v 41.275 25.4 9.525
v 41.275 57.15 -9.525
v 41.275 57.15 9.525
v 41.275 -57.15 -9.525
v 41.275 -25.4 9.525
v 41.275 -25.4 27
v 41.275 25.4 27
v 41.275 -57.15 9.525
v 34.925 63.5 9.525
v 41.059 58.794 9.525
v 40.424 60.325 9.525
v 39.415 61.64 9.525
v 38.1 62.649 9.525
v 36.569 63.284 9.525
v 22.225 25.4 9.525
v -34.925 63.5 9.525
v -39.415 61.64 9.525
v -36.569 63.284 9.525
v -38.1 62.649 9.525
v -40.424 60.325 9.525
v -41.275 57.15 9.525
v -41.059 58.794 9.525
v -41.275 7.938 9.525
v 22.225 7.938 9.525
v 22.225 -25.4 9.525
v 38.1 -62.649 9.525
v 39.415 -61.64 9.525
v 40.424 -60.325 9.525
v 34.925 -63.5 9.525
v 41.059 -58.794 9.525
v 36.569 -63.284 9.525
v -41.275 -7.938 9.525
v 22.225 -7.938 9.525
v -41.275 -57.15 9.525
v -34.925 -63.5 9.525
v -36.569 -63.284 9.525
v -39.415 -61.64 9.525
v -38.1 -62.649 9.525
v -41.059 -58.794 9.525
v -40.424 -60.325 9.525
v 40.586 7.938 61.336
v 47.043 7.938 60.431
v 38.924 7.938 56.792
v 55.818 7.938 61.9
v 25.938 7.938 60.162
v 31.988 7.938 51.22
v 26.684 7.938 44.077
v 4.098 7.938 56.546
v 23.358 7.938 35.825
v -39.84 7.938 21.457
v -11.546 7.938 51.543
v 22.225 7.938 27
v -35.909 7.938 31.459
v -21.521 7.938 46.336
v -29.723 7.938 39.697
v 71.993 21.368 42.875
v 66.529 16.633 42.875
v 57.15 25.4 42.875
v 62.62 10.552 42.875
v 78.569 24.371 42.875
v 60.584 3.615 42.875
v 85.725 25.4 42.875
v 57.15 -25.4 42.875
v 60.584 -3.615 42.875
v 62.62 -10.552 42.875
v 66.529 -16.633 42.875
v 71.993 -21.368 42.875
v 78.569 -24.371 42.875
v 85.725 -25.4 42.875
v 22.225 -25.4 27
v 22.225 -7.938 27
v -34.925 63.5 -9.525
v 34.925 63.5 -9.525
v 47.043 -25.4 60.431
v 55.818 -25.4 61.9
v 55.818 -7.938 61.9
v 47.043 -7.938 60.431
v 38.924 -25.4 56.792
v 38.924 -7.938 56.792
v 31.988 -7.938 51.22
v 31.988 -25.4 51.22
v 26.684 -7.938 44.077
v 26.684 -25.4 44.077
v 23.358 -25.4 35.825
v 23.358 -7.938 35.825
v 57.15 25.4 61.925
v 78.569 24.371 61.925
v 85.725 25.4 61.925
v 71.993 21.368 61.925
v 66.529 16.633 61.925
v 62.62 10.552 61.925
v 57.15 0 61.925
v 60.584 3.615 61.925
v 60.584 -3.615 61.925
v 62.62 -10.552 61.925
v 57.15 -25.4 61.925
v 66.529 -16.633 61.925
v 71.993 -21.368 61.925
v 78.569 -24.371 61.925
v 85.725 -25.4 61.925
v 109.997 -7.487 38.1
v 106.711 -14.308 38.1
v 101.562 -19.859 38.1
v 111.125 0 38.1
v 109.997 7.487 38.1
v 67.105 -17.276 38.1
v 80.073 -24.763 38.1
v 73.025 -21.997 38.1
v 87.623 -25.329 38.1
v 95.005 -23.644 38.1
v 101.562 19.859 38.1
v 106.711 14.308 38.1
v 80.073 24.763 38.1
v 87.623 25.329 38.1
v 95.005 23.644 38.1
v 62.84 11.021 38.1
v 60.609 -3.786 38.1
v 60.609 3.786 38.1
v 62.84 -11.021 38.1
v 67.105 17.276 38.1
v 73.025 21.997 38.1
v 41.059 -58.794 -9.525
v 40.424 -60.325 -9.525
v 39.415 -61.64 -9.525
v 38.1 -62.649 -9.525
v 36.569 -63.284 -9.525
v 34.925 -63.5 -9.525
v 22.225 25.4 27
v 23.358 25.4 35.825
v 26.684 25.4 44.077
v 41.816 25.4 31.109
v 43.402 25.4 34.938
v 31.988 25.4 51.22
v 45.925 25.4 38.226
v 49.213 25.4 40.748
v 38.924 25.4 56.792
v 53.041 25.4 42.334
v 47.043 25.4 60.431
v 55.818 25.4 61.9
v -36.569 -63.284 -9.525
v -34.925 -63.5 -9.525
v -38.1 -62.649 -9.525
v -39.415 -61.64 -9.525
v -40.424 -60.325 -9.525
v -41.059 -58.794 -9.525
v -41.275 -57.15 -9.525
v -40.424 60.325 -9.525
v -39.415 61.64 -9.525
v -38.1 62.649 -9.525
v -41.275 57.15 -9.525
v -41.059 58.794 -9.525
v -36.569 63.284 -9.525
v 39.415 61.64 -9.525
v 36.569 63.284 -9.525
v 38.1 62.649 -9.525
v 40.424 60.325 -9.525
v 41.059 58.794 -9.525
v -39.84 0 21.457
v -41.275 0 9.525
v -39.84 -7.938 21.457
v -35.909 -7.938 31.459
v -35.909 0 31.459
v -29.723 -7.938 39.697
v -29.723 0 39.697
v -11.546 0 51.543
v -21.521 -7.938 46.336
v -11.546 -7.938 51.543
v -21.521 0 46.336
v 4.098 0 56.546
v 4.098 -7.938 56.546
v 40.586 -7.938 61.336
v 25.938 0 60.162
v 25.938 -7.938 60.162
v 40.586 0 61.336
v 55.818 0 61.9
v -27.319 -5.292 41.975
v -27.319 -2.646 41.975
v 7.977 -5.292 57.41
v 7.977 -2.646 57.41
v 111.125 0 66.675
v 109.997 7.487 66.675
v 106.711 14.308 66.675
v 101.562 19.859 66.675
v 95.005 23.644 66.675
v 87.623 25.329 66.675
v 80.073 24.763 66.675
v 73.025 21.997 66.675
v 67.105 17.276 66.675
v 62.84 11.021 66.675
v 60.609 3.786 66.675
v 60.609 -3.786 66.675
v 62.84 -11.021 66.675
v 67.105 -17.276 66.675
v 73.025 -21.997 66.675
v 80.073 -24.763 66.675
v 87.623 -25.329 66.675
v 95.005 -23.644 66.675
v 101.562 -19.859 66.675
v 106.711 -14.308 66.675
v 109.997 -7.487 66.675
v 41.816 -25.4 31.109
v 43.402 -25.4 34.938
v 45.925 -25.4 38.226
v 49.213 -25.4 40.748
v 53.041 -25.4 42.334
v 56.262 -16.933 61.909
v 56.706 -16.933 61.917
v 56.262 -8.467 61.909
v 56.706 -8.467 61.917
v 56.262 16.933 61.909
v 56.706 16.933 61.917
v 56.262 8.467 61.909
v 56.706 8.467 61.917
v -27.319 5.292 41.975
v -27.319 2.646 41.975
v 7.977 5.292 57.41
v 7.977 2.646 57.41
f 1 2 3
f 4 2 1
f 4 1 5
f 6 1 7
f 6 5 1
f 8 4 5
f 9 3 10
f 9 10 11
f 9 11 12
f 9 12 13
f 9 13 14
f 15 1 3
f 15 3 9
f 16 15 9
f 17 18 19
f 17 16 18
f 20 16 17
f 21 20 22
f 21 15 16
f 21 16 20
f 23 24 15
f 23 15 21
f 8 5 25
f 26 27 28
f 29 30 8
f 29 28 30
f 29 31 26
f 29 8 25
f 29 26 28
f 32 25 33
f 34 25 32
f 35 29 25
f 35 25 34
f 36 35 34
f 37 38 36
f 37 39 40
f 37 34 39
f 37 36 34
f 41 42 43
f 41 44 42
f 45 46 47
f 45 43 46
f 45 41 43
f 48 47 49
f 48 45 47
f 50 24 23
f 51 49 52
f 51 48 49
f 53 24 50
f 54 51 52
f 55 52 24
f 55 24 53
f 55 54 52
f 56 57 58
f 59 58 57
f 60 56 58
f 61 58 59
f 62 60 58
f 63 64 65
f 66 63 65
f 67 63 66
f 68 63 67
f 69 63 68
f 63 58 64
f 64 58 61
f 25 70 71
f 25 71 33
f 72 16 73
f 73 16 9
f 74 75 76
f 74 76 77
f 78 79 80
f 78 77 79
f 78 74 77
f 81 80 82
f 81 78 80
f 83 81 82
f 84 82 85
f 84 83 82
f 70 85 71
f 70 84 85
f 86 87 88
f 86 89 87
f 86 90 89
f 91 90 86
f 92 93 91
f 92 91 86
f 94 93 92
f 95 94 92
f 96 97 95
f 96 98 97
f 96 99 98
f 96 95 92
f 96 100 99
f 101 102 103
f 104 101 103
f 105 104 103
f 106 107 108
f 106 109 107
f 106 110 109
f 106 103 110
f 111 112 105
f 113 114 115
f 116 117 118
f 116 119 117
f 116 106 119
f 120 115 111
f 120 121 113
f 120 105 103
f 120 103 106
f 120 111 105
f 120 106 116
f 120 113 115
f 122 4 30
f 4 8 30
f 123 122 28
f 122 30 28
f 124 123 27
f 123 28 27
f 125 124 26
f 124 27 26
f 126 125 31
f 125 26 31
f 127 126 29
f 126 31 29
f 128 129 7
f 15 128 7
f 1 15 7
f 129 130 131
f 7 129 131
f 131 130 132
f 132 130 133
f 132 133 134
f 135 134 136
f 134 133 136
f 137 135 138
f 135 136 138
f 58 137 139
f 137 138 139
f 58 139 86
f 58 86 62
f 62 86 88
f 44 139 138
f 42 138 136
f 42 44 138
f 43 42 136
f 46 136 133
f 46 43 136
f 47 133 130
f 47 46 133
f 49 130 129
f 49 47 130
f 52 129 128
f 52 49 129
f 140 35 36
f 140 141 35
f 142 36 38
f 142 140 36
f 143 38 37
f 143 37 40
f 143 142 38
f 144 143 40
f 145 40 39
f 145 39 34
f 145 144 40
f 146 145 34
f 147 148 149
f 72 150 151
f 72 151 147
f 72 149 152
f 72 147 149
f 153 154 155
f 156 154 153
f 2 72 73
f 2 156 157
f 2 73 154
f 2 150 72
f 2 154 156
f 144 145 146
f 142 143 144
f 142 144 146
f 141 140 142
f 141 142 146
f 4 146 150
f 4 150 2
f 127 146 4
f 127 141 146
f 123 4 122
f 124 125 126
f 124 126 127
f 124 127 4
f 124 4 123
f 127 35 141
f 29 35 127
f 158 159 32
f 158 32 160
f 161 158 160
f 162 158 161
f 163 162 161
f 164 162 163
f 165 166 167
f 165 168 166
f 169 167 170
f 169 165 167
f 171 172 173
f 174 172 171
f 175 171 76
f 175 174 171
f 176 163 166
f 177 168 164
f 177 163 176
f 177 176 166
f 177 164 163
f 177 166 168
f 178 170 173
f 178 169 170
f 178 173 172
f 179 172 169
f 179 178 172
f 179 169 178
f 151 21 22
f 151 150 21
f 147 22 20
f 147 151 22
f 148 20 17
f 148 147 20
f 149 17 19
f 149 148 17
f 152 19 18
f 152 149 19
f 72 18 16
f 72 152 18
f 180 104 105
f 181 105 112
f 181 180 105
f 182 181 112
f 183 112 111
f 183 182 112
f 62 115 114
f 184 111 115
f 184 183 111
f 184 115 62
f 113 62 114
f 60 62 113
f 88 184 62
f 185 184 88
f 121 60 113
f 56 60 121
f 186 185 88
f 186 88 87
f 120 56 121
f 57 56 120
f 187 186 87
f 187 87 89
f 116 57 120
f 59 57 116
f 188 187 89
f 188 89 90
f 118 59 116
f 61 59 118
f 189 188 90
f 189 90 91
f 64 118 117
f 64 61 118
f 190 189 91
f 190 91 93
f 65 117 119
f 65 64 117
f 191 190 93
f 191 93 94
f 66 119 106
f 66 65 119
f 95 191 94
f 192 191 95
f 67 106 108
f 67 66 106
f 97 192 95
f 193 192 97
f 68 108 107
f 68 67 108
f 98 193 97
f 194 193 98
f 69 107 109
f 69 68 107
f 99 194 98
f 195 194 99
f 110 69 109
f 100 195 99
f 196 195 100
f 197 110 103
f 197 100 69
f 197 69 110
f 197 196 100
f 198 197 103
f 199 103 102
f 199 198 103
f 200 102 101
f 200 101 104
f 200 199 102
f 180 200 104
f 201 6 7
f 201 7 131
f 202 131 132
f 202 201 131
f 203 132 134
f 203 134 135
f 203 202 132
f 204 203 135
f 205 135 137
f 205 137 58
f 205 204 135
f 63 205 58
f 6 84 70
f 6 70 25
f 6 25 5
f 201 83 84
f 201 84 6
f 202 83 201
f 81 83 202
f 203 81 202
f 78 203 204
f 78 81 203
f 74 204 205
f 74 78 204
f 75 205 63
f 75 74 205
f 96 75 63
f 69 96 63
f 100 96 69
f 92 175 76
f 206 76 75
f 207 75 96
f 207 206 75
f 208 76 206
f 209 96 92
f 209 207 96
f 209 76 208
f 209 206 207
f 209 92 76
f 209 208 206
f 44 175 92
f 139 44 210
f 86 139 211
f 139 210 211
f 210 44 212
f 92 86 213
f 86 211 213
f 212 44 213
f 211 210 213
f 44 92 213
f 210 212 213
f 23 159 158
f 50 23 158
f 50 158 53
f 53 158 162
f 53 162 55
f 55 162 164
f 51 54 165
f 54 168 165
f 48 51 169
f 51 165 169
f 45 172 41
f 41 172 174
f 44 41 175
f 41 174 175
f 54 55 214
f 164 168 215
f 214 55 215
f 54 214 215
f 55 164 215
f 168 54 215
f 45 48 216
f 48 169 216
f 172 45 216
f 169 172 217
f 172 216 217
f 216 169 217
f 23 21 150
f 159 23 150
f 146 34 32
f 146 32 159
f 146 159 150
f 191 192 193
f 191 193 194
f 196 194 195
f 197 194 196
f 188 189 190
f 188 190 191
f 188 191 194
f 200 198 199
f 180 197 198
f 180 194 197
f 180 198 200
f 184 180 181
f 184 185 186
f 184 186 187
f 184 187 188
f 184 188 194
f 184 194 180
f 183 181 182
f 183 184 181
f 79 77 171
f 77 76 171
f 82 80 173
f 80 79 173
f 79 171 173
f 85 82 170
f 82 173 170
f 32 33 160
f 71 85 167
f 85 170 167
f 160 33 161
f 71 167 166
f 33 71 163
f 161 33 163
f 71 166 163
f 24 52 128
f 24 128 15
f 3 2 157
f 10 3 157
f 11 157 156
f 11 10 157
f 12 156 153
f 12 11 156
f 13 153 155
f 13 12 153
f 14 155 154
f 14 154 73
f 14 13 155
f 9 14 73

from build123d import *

# Parameters (mm, degrees)
F1_DEPTH = 63.5
F0_W     = 25.4
F0_H     = 19.05
F2_DEPTH = 25.4
F3_DEPTH = 7.9375
F4_DEPTH = 25.4
F6_R     = 6.35


with BuildPart() as f1:
    # F0 (on Front) → F1 (new body, symmetric)
    with BuildSketch(Plane.XZ):
        Polygon((-41.275, 9.525), (-41.275, -9.525), (41.275, -9.525), (41.275, 9.525), (22.225, 9.525), align=None)
    extrude(amount=F1_DEPTH, both=True)

    # F0 (on Front) → F2 (join, symmetric)
    with BuildSketch(Plane.XZ):
        with BuildLine():
            Line((22.225, 9.525), (41.275, 9.525))
            Line((41.275, 9.525), (41.275, 27.0002))
            ThreePointArc((41.275, 27.0002), (45.9246798487, 38.2255201513), (57.15, 42.8752))
            Line((57.15, 42.8752), (60.325, 42.8752))
            Line((60.325, 42.8752), (60.325, 61.9252))
            Line((60.325, 61.9252), (57.15, 61.9252))
            add(Edge.make_bspline(
                [(55.8177831664, 61.8997819933), (56.2614415323, 61.9087982491), (56.7055224041, 61.9172649875), (57.15, 61.9252)],
                knots=[110.5462795592, 110.5462795592, 110.5462795592, 110.5462795592, 111.5045361635, 111.5045361635, 111.5045361635, 111.5045361635], degree=3))
            ThreePointArc((55.8177831664, 61.8997819933), (31.9876938864, 51.2203151121), (22.225, 27.0002))
            Line((22.225, 27.0002), (22.225, 9.525))
        make_face()
        with Locations((73.025, 52.4002)):
            Rectangle(F0_W, F0_H)
    extrude(amount=F2_DEPTH, both=True)

    # F0 (on Front) → F3 (join, symmetric)
    with BuildSketch(Plane.XZ):
        with BuildLine():
            add(Edge.make_bspline(
                [(-41.275, 9.525), (-40.9218768846, 52.5063416026), (4.6365217787, 60.8596498155), (55.8177831664, 61.8997819933)],
                knots=[0, 0, 0, 0, 110.5462795592, 110.5462795592, 110.5462795592, 110.5462795592], degree=3))
            Line((-41.275, 9.525), (22.225, 9.525))
            Line((22.225, 9.525), (22.225, 27.0002))
            ThreePointArc((22.225, 27.0002), (31.9876938864, 51.2203151121), (55.8177831664, 61.8997819933))
        make_face()
    extrude(amount=F3_DEPTH, both=True)

    # F0 (on Front) → F4 (join, symmetric)
    with BuildSketch(Plane.XZ):
        with Locations((73.025, 52.4002)):
            Rectangle(F0_W, F0_H)
    extrude(amount=F4_DEPTH, both=True)

    # F0 (on Front) → F5 (revolve)
    with BuildSketch(Plane.XZ):
        Polygon((85.725, 66.675), (85.725, 61.9252), (85.725, 42.8752), (85.725, 38.1), (111.125, 38.1), (111.125, 66.675), align=None)
    revolve(axis=Axis((85.725, 0, 52.3875), (0, 0, 1)))

    # F6
    f6_edges = [f1.edges().sort_by_distance(p)[0] for p in [
        (41.275, -63.5, 0),
        (-41.275, 63.5, 0),
        (-41.275, -63.5, 0),
        (41.275, 63.5, 0),
    ]]
    fillet(f6_edges, radius=F6_R)


solid = f1.part
